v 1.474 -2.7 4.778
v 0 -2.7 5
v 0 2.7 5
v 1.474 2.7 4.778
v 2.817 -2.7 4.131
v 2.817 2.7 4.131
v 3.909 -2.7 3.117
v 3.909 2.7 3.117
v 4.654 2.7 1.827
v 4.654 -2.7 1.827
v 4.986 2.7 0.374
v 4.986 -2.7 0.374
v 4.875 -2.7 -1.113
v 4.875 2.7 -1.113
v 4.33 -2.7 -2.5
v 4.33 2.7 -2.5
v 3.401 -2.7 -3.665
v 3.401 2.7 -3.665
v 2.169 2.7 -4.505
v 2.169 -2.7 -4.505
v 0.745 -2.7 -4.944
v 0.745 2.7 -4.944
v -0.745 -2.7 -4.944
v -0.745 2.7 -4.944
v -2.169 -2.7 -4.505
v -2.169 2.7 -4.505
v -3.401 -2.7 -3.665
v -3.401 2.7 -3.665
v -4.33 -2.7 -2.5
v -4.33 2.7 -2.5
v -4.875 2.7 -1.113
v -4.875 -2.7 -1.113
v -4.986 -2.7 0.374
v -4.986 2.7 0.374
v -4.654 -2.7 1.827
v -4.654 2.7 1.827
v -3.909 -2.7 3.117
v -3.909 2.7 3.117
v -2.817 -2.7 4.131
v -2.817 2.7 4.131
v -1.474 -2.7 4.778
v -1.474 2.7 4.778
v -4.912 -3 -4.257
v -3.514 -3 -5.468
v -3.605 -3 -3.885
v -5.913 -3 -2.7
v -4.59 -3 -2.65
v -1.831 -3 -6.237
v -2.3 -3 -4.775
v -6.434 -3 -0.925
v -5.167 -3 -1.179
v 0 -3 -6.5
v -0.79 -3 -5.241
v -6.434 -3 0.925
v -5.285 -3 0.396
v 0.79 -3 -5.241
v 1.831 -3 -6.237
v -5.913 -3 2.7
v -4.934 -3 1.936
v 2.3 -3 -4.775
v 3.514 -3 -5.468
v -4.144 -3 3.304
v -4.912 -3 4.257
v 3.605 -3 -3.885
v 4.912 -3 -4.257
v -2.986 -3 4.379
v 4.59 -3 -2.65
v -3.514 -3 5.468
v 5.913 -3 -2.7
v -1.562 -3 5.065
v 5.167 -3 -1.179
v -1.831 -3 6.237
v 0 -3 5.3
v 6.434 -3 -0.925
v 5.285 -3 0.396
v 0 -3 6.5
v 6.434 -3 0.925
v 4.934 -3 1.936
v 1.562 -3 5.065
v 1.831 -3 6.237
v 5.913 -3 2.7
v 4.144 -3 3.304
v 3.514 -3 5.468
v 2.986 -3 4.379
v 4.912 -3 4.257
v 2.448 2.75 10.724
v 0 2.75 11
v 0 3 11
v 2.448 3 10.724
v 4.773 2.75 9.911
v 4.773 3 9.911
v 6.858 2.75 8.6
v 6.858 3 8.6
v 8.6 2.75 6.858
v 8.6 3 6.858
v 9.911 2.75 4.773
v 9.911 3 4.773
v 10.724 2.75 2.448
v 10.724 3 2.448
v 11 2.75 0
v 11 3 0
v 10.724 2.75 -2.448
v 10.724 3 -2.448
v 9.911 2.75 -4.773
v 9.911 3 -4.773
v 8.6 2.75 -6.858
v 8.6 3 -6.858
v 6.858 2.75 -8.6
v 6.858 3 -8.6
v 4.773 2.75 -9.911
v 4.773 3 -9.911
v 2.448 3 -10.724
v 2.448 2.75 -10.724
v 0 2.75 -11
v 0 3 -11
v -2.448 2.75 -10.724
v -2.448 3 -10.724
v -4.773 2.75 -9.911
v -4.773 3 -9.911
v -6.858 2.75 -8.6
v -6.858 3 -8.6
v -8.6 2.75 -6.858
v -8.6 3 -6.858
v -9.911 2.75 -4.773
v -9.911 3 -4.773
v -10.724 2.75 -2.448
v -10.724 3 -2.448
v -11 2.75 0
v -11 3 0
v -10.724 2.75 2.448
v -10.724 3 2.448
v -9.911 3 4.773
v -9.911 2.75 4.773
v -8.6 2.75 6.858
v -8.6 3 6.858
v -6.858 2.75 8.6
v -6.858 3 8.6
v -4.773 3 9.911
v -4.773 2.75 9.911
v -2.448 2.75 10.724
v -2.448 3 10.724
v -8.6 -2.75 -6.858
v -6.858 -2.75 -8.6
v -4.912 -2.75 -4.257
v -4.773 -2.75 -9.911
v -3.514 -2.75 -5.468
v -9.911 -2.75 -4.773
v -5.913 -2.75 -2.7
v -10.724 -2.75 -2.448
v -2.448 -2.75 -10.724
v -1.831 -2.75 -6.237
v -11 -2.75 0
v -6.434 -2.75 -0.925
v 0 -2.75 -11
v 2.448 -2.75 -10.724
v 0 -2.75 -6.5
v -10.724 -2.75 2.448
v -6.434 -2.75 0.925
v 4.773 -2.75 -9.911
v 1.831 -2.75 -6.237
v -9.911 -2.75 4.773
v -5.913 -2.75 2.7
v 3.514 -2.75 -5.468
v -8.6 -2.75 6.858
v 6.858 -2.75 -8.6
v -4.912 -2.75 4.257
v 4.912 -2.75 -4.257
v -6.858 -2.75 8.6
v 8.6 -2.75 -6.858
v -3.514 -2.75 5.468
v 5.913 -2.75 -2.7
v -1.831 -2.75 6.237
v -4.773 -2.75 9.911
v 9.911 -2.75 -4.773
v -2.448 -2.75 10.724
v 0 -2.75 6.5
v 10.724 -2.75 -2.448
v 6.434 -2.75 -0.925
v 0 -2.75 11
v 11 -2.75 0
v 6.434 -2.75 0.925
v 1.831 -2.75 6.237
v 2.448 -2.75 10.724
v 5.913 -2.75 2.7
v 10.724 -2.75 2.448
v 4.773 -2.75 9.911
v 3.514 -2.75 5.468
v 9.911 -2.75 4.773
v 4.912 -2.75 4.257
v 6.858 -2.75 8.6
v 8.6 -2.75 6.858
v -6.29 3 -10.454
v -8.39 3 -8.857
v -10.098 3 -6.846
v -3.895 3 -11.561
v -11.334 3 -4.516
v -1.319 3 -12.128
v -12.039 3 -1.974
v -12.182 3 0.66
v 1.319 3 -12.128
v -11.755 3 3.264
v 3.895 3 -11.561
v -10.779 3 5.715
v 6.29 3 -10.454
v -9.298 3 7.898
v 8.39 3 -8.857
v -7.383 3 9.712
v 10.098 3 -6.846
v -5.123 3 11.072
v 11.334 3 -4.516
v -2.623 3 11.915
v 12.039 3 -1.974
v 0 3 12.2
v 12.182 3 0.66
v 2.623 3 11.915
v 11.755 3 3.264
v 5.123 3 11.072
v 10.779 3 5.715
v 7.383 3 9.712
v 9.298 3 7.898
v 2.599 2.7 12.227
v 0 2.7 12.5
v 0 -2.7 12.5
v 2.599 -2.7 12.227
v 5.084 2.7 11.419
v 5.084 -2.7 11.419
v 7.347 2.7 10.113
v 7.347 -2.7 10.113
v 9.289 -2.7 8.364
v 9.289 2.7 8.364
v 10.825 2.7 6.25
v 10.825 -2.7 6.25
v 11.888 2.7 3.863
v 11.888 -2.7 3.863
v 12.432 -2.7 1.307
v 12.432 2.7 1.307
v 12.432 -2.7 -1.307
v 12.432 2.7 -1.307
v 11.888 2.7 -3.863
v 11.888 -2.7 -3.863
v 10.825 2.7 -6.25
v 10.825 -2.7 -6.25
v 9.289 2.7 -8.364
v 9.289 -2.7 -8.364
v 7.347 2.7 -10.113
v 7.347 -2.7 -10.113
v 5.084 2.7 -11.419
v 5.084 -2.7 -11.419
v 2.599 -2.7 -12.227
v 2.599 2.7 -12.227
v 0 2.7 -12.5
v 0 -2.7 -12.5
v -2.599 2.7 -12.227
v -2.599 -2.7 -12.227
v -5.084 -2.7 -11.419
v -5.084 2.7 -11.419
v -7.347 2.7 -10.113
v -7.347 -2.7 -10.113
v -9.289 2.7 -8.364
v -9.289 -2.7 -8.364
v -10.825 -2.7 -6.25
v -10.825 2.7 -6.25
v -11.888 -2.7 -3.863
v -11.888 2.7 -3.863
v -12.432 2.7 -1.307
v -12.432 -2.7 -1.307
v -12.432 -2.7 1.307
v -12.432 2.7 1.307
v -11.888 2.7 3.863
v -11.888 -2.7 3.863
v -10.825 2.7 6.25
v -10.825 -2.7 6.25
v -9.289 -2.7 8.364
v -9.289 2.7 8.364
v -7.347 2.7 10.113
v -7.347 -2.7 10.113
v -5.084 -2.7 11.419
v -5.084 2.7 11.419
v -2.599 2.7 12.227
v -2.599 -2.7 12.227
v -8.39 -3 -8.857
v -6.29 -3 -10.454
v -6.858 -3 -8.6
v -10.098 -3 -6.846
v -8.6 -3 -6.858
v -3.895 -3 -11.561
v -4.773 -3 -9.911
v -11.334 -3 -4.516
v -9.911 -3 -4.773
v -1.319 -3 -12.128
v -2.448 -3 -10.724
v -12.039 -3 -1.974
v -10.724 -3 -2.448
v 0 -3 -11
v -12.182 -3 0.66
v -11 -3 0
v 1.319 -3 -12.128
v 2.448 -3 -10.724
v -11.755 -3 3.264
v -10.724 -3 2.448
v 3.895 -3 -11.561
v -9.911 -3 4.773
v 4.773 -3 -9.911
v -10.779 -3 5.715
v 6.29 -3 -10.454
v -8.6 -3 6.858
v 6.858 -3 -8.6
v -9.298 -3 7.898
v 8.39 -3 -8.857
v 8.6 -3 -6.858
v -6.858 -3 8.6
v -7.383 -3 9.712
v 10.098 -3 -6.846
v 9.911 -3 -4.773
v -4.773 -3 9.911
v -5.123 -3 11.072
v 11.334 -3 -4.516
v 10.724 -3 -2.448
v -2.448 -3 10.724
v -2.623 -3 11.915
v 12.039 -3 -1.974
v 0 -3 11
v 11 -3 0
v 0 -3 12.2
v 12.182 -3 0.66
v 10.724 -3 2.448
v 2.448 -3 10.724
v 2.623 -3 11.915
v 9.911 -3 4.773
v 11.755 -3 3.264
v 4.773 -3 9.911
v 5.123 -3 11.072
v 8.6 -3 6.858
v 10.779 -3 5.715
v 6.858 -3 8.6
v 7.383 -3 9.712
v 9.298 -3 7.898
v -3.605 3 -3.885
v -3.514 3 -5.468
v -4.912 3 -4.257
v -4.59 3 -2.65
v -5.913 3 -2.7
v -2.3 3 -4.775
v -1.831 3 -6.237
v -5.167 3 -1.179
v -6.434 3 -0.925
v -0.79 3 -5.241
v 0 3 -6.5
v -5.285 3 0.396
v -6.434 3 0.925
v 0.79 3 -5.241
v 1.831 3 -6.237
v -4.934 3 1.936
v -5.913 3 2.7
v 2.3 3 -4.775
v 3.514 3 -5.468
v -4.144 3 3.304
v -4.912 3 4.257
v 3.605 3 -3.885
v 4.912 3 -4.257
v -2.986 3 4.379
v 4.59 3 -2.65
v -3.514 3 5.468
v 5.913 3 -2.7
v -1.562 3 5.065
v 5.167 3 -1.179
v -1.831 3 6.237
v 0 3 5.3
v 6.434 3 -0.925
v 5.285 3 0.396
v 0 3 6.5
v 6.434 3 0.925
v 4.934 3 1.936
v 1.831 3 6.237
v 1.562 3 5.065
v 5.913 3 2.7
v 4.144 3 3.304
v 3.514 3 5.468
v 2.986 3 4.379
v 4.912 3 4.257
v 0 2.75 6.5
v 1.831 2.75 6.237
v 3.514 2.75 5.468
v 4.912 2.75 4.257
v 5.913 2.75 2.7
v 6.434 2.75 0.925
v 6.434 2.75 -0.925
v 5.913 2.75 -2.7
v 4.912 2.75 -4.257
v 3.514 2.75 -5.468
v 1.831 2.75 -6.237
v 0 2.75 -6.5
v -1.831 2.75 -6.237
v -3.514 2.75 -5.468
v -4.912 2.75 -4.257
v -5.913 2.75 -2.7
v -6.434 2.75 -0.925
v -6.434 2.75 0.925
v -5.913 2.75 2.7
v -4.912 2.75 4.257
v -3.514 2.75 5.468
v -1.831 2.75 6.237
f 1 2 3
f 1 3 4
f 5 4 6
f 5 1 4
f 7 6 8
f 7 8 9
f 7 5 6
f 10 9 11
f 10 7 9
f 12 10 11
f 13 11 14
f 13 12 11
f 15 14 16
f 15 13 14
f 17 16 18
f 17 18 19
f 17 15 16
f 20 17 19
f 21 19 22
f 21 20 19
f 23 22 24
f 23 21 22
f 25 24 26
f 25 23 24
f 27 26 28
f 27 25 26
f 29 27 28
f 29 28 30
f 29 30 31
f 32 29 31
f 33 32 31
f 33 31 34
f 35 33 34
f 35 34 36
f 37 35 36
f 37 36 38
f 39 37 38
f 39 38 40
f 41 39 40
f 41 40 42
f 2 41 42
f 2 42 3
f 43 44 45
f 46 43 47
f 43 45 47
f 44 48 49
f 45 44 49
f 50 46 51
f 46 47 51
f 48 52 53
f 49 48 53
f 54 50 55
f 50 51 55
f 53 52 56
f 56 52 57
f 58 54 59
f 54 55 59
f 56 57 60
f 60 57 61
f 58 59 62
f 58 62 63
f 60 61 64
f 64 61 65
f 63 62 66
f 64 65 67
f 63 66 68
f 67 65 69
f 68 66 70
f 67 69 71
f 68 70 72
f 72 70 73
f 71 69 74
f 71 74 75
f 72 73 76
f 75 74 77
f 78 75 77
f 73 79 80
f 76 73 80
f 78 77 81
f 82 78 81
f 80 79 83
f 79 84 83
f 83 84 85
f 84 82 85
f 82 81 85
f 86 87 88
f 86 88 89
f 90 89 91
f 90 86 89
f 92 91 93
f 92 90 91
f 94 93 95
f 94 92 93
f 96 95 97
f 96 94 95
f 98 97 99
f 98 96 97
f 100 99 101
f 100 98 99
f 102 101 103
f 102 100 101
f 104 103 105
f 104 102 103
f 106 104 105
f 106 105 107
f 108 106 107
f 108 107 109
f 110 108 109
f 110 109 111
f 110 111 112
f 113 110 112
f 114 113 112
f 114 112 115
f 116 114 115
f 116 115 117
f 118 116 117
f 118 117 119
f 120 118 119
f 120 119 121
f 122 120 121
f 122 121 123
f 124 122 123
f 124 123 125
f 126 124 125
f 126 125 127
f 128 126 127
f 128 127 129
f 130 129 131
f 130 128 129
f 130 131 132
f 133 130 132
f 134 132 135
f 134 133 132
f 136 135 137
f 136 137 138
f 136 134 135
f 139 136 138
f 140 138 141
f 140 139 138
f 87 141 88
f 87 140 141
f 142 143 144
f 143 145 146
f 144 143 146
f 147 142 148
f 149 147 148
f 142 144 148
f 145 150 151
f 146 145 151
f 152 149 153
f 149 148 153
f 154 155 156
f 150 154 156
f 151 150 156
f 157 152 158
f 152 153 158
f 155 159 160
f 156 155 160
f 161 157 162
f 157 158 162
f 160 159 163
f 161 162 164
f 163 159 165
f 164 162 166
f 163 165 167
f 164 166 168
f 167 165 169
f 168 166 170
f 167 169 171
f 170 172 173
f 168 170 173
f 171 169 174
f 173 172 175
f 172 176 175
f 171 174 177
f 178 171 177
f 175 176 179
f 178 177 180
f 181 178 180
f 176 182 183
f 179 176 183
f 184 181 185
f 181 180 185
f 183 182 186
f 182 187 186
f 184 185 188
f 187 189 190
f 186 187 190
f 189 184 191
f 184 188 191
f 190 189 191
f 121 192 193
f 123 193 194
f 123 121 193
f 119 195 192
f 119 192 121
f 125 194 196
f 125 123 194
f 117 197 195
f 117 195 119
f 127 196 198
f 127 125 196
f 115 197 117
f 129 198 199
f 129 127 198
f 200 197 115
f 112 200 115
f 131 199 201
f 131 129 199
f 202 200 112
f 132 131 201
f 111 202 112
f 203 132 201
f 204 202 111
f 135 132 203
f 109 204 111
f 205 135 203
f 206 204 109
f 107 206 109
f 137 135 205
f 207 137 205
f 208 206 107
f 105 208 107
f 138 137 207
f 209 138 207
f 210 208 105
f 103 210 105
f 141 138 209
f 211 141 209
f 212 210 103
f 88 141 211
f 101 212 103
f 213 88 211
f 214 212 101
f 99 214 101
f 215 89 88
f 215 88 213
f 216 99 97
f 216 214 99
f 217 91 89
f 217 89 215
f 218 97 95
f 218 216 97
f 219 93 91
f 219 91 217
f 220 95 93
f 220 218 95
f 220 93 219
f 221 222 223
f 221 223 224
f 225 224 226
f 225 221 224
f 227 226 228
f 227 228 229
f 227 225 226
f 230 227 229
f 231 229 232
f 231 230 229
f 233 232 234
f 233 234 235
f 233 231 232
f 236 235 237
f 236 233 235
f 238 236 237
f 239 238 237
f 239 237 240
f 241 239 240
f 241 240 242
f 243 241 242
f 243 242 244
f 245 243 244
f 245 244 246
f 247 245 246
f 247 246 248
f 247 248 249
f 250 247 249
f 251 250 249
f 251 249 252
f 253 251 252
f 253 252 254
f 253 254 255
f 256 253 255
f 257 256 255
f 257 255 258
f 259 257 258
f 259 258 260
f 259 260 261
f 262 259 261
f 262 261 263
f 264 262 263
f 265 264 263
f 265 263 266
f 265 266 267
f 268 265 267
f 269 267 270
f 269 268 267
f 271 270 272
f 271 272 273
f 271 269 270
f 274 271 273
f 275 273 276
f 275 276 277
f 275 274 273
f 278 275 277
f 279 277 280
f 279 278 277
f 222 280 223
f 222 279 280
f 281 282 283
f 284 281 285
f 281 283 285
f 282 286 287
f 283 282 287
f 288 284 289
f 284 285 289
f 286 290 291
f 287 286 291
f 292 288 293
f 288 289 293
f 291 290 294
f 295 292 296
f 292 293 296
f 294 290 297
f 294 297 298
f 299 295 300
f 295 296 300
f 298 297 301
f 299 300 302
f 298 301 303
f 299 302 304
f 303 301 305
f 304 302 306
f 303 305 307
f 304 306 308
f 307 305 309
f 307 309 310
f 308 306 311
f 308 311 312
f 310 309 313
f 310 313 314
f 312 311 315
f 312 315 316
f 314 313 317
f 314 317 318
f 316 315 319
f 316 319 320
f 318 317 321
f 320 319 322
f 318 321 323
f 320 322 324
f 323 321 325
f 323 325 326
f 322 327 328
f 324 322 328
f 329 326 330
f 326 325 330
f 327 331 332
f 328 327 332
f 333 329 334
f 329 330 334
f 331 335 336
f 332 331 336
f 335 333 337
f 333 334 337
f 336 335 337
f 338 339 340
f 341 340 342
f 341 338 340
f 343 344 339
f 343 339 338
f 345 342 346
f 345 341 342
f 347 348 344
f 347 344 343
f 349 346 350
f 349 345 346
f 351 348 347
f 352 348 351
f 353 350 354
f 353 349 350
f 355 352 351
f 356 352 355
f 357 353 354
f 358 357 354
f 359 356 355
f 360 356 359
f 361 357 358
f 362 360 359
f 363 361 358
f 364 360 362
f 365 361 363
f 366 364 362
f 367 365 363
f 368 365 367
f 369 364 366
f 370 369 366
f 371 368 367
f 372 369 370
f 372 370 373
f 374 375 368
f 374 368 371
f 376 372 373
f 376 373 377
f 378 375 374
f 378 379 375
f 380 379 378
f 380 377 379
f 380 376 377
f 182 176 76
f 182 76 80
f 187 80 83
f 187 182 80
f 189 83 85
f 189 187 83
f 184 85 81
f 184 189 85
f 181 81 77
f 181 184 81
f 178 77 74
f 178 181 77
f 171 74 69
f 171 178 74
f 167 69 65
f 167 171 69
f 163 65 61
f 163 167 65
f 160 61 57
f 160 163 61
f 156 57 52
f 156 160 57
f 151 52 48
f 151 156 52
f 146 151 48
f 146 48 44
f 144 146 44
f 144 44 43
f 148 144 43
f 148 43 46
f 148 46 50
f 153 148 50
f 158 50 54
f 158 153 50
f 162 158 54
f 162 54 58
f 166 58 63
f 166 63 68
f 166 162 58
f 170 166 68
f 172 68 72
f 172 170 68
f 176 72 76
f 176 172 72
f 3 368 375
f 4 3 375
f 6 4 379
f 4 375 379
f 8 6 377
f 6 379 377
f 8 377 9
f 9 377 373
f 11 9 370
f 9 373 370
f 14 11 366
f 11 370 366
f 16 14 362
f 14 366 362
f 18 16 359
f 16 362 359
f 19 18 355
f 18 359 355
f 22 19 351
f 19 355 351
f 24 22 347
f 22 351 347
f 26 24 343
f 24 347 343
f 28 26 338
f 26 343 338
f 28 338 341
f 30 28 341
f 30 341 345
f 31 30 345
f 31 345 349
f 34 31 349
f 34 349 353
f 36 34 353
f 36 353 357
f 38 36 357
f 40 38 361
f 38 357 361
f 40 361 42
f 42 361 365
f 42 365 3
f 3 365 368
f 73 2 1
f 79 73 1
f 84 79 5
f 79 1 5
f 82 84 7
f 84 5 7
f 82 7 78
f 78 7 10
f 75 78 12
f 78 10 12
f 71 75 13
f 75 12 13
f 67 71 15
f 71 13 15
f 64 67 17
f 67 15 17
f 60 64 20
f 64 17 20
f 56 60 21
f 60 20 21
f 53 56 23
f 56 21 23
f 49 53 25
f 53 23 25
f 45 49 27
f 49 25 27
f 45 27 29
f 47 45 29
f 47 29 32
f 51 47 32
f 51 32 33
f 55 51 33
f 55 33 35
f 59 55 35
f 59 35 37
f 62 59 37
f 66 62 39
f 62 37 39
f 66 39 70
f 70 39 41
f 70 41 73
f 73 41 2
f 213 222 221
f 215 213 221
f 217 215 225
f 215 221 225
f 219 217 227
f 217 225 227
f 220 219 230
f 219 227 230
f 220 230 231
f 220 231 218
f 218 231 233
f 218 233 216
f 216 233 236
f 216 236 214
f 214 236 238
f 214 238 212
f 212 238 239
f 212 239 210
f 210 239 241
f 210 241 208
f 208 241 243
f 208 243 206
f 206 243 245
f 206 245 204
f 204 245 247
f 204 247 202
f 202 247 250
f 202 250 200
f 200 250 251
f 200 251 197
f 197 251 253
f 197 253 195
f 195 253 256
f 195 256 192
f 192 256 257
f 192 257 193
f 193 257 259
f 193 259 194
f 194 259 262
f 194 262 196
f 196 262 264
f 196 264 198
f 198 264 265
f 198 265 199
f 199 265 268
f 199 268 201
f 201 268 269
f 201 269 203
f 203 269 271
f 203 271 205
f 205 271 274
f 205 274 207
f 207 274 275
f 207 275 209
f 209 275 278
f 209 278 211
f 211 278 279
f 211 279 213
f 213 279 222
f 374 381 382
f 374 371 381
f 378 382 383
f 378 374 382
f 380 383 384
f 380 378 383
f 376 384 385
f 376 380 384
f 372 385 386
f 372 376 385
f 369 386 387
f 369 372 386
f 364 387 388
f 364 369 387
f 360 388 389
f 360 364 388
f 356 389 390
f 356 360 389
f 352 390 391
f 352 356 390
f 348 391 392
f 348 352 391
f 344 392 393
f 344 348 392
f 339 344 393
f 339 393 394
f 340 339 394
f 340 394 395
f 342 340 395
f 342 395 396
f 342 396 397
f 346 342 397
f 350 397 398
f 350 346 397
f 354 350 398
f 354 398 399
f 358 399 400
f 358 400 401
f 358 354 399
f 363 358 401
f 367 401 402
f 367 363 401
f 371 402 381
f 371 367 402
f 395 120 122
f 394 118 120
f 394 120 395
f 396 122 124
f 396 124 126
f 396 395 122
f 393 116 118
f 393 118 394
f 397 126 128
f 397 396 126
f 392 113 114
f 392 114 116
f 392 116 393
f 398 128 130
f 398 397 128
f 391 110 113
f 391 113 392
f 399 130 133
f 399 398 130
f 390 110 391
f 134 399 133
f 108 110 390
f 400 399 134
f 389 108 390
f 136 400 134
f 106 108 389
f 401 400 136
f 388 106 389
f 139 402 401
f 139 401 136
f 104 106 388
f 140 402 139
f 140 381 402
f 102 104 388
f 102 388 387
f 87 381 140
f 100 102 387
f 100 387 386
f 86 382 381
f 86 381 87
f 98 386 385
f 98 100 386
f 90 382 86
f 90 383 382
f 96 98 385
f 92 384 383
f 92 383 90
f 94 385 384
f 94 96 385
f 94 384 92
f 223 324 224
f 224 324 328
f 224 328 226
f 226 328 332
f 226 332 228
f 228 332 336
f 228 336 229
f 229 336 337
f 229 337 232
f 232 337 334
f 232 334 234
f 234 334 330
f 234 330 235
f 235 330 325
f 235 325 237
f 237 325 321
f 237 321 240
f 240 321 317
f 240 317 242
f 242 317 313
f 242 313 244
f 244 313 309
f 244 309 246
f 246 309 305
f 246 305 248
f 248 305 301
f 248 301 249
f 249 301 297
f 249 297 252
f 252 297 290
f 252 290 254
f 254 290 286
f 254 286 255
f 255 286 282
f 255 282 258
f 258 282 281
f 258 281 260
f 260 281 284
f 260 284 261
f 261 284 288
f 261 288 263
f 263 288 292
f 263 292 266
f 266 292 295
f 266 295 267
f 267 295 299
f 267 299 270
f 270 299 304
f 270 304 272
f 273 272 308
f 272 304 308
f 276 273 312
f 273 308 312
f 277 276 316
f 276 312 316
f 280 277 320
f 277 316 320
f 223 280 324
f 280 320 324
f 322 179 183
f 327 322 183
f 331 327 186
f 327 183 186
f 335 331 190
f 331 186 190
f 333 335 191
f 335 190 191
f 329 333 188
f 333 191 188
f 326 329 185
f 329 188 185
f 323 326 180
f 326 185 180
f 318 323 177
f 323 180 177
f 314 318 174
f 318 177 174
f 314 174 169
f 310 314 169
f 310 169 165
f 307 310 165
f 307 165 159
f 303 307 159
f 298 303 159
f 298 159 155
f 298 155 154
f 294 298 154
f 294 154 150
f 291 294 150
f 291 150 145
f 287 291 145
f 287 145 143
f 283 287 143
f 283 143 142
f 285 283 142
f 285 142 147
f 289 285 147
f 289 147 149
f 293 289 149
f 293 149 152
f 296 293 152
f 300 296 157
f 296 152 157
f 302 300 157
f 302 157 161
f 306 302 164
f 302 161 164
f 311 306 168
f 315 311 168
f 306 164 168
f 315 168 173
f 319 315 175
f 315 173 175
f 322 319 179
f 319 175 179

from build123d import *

# Parameters (mm, degrees)
SKETCH1_R           = 11
SKETCH1_R_2         = 6.5
BOSS_EXTRUDE1_DEPTH = 2.75
SKETCH1_3_R         = 12.5
SKETCH1_3_R_2       = 11
SKETCH1_3_R_3       = 6.5
SKETCH1_3_R_4       = 5
BOSS_EXTRUDE2_DEPTH = 3
CHAMFER1_SIZE       = 0.3


with BuildPart() as part:
    # Sketch1 → Boss-Extrude1 (new, symmetric)
    with BuildSketch(Plane(origin=(0, 0, 0), x_dir=(1, 0, 0), z_dir=(0, 1, 0))):
        Circle(SKETCH1_R)
        Circle(SKETCH1_R_2, mode=Mode.SUBTRACT)
    extrude(amount=BOSS_EXTRUDE1_DEPTH, both=True)

    # Sketch1<3> → Boss-Extrude2 (add, symmetric)
    # profile 1 of 2: a face of its own
    with BuildSketch(Plane(origin=(0, 0, 0), x_dir=(1, 0, 0), z_dir=(0, 1, 0))):
        Circle(SKETCH1_3_R)
        Circle(SKETCH1_3_R_2, mode=Mode.SUBTRACT)
    # profile 2 of 2: a face of its own
    with BuildSketch(Plane(origin=(0, 0, 0), x_dir=(1, 0, 0), z_dir=(0, 1, 0))):
        Circle(SKETCH1_3_R_3)
        Circle(SKETCH1_3_R_4, mode=Mode.SUBTRACT)
    extrude(amount=BOSS_EXTRUDE2_DEPTH, both=True)

    # Chamfer1
    chamfer1_edges = [part.edges().sort_by_distance(p)[0] for p in [
        (-5, -3, 0),
        (-5, 3, 0),
        (-12.5, -3, 0),
        (-12.5, 3, 0),
    ]]
    chamfer(chamfer1_edges, length=CHAMFER1_SIZE)


solid = part.part
